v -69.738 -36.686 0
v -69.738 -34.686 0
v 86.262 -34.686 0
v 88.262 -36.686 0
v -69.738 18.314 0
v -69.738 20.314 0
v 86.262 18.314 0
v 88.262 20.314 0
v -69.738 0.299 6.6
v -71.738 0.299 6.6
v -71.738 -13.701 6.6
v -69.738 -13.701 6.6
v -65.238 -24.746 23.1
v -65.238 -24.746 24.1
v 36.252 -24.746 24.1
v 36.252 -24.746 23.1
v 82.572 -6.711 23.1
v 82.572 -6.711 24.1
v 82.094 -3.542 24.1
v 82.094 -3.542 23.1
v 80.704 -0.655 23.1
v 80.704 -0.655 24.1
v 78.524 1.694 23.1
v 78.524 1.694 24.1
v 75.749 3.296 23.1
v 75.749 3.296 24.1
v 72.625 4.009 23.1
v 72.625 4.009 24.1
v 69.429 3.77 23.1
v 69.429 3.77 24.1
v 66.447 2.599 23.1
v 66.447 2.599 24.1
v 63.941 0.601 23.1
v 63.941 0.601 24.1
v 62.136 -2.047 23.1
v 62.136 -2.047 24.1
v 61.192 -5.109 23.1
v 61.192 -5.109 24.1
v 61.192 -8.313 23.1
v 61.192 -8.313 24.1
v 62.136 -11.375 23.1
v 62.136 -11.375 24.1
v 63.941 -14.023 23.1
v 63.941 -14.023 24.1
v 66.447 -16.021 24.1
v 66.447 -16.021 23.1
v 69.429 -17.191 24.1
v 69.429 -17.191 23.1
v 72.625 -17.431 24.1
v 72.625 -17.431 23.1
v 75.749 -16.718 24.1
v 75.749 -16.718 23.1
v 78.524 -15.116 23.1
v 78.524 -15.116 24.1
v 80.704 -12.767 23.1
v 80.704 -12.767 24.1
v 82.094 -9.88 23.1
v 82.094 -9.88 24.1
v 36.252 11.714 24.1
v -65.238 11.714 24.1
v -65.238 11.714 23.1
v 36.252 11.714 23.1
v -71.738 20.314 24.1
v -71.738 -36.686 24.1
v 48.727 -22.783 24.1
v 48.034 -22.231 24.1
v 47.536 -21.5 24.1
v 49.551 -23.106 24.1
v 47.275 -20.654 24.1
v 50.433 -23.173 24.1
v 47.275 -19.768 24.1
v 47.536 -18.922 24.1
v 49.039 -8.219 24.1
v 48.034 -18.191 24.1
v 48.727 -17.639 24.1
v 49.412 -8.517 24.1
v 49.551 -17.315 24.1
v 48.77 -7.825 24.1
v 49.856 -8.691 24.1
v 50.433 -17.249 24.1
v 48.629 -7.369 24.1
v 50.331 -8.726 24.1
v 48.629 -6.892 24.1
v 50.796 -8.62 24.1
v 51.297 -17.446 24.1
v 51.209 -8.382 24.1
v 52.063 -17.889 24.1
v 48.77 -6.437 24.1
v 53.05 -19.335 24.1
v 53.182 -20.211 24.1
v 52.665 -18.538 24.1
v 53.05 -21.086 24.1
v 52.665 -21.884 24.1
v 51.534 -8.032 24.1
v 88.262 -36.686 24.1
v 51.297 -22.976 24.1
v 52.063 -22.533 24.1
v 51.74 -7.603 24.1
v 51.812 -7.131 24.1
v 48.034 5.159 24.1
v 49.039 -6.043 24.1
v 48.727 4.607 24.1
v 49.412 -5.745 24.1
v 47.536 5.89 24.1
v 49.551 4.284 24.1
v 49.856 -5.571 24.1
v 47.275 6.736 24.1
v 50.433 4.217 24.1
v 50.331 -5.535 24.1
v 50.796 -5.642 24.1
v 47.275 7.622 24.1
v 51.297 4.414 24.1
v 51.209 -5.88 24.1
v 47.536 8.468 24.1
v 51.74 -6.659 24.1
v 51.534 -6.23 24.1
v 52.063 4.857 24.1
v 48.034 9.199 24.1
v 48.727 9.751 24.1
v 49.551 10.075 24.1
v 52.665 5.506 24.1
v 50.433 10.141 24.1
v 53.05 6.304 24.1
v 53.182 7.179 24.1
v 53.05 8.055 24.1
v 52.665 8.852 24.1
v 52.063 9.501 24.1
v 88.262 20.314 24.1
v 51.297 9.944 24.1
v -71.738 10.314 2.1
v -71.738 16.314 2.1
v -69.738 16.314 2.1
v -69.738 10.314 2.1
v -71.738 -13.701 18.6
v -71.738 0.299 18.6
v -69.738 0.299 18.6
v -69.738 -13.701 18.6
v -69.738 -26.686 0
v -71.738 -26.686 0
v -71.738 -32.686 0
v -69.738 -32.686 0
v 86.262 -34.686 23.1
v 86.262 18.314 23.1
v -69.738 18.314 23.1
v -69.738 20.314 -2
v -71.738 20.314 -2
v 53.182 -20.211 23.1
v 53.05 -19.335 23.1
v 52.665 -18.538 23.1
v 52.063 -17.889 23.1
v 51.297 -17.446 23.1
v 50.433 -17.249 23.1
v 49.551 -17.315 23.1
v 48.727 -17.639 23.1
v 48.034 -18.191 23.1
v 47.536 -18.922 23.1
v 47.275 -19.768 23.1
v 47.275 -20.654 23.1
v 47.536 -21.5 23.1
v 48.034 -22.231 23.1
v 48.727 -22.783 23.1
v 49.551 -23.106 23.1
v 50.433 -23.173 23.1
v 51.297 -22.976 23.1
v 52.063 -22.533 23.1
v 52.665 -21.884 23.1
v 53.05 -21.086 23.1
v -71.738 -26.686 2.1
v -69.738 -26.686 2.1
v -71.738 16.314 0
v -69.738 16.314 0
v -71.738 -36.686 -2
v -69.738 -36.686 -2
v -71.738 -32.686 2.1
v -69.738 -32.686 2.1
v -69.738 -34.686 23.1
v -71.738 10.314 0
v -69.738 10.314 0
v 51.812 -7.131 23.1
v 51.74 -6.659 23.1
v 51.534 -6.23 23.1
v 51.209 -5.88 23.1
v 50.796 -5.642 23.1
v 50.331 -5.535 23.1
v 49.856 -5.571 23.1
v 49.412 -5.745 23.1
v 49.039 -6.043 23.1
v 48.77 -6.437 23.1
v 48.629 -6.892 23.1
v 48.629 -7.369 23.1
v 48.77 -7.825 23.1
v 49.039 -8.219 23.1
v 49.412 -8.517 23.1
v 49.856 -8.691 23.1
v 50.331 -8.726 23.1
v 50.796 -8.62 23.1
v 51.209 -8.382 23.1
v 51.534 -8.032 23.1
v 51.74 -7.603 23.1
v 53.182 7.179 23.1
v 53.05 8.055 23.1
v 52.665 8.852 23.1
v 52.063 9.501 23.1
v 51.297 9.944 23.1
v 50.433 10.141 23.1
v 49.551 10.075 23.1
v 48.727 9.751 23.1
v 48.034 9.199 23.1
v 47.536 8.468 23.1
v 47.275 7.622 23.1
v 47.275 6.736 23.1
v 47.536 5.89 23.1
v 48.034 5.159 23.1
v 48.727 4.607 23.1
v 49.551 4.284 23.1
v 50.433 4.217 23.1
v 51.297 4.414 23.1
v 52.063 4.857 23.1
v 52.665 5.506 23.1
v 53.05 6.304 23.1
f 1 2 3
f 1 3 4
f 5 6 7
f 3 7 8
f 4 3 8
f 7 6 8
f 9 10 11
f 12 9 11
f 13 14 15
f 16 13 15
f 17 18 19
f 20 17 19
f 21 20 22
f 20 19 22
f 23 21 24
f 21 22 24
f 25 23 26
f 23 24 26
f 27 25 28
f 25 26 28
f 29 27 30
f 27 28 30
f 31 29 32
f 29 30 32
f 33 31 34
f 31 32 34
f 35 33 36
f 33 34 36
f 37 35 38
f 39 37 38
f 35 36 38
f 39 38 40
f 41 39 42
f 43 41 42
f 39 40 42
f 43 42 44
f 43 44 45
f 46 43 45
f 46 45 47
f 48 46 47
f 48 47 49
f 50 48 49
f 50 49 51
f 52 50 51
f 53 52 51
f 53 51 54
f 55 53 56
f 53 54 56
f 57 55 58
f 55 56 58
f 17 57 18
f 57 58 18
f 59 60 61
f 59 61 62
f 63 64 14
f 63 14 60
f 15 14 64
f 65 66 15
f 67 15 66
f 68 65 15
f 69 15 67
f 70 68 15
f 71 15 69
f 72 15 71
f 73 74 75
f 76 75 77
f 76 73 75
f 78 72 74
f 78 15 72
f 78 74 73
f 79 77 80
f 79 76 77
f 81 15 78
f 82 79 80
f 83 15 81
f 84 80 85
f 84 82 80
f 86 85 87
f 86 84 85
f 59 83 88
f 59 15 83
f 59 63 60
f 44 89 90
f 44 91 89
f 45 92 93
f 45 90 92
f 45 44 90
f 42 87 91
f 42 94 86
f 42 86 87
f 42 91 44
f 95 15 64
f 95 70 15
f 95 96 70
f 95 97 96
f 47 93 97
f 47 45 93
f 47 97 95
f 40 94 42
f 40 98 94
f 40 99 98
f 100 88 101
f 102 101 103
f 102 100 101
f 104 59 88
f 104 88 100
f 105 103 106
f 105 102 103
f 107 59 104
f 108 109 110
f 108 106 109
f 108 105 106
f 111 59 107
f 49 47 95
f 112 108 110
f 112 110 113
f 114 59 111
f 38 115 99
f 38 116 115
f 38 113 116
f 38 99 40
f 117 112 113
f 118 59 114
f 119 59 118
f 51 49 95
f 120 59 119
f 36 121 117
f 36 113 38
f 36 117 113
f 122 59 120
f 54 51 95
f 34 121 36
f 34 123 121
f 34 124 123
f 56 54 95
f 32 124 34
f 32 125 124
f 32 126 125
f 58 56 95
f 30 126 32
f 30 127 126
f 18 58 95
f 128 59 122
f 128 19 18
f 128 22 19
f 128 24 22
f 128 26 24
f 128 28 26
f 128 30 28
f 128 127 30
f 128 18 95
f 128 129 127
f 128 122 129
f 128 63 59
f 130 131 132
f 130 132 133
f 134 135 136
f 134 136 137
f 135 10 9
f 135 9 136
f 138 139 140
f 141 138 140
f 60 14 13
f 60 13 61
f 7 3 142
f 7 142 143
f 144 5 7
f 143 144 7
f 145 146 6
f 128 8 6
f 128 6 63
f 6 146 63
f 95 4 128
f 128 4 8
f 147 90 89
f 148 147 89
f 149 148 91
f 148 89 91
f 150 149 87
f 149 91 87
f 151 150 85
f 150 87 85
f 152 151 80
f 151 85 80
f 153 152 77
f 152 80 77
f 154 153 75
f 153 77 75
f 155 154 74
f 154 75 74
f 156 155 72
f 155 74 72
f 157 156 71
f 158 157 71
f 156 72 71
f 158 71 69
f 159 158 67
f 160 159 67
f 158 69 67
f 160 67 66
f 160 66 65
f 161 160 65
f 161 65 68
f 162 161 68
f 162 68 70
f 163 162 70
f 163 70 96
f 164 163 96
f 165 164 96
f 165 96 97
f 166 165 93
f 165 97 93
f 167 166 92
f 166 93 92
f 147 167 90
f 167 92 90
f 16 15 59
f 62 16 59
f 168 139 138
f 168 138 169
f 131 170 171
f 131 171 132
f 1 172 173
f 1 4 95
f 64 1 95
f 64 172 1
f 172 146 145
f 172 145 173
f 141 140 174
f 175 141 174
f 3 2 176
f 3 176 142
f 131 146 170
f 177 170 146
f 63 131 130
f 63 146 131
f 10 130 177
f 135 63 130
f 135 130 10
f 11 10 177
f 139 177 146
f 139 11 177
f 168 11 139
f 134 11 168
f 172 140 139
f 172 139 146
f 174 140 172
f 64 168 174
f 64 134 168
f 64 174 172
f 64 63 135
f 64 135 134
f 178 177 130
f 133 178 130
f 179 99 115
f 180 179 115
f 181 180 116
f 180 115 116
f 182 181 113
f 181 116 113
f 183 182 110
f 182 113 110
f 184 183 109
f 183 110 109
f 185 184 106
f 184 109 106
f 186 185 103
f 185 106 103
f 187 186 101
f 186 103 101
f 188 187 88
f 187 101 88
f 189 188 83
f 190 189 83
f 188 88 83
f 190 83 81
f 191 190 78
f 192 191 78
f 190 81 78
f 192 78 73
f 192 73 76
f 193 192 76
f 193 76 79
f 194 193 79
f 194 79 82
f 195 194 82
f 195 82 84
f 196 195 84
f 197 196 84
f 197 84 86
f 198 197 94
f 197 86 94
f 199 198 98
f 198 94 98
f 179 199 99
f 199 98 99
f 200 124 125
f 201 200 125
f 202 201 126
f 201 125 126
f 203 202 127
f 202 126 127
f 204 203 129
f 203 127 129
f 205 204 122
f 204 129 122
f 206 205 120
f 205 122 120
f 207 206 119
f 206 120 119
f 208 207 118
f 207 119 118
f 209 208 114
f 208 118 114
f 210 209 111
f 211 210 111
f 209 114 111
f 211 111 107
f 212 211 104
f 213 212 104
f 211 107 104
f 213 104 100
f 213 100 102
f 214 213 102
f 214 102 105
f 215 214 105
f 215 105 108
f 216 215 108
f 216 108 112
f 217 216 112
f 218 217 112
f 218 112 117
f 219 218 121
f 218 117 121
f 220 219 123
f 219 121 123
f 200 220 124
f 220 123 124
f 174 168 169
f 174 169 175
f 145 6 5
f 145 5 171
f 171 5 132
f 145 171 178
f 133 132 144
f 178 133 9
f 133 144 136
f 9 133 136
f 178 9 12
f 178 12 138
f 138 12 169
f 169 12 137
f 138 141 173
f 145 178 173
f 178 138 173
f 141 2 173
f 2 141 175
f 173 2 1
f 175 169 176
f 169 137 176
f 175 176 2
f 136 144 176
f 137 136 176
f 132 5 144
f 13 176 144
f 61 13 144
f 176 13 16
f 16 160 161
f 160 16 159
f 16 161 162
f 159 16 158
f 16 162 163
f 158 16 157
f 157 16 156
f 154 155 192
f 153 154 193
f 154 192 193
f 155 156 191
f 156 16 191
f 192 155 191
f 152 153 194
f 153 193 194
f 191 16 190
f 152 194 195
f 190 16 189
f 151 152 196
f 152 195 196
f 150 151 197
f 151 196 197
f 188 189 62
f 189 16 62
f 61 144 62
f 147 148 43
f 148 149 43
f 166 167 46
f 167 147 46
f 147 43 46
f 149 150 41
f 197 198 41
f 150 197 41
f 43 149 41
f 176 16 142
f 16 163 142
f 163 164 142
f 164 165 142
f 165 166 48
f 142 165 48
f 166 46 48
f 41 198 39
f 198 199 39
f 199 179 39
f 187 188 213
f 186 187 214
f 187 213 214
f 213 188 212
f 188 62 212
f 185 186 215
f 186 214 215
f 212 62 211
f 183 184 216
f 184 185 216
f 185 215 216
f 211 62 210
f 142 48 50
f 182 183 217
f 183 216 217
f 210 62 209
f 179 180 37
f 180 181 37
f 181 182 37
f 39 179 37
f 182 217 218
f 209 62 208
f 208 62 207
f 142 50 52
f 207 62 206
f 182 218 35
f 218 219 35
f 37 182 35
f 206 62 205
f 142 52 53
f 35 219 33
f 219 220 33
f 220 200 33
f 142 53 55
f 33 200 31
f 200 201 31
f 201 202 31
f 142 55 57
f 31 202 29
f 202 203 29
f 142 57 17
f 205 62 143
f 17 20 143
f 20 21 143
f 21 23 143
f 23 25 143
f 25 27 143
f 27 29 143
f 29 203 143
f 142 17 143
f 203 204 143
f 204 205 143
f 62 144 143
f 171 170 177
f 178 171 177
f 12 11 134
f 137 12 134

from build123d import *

# Parameters (mm, degrees)
SKETCH_W        = 160
SKETCH_H        = 57
SKETCH_W_2      = 156
SKETCH_H_2      = 53
PAD_DEPTH       = 23.1
SKETCH001_W     = 160
SKETCH001_H     = 57
PAD001_DEPTH    = 1
SKETCH002_R     = 10.75
SKETCH002_R_2   = 2.97
SKETCH002_R_3   = 1.6
SKETCH002_W     = 101.49
SKETCH002_H     = 36.46
POCKET_DEPTH    = 1
SKETCH003_W     = 6
SKETCH003_H     = 2.1
SKETCH003_W_2   = 14
SKETCH003_H_2   = 12
POCKET001_DEPTH = 5
SKETCH005_W     = 57
SKETCH005_H     = 2
PAD002_DEPTH    = 2


with BuildPart() as part:
    # Sketch → Pad (new body)
    with BuildSketch(Plane.XY):
        with Locations((8.261541, -8.185916)):
            Rectangle(SKETCH_W, SKETCH_H)
        with Locations((8.261541, -8.185916)):
            Rectangle(SKETCH_W_2, SKETCH_H_2, mode=Mode.SUBTRACT)
    extrude(amount=PAD_DEPTH)

    # Sketch001 → Pad001 (new body)
    with BuildSketch(Plane.XY.offset(23.1)):
        with Locations((8.261541, -8.185916)):
            Rectangle(SKETCH001_W, SKETCH001_H)
    extrude(amount=PAD001_DEPTH)

    # Sketch002 → Pocket (cut)
    with BuildSketch(Plane.XY.offset(24.1)):
        with Locations((71.821541, -6.710916)):
            Circle(SKETCH002_R)
        with Locations((50.211541, -20.210916)):
            Circle(SKETCH002_R_2)
        with Locations((50.211541, 7.179084)):
            Circle(SKETCH002_R_2)
        with Locations((50.211541, -7.130916)):
            Circle(SKETCH002_R_3)
        with Locations((-14.493459, -6.515916)):
            Rectangle(SKETCH002_W, SKETCH002_H)
    extrude(amount=-POCKET_DEPTH, mode=Mode.SUBTRACT)

    # Sketch003 → Pocket001 (cut)
    with BuildSketch(Plane(origin=(-71.738459, 0, 0), x_dir=(0, -1, 0), z_dir=(-1, 0, 0))):
        with Locations((-13.314084, 1.05)):
            Rectangle(SKETCH003_W, SKETCH003_H)
        with Locations((6.700916, 12.6)):
            Rectangle(SKETCH003_W_2, SKETCH003_H_2)
        with Locations((29.685916, 1.05)):
            Rectangle(SKETCH003_W, SKETCH003_H)
    extrude(amount=-POCKET001_DEPTH, mode=Mode.SUBTRACT)

    # Sketch005 → Pad002 (new body)
    with BuildSketch(Plane(origin=(-71.738459, 0, 0), x_dir=(0, -1, 0), z_dir=(-1, 0, 0))):
        with Locations((8.185916, -1)):
            Rectangle(SKETCH005_W, SKETCH005_H)
    extrude(amount=-PAD002_DEPTH)


solid = part.part
